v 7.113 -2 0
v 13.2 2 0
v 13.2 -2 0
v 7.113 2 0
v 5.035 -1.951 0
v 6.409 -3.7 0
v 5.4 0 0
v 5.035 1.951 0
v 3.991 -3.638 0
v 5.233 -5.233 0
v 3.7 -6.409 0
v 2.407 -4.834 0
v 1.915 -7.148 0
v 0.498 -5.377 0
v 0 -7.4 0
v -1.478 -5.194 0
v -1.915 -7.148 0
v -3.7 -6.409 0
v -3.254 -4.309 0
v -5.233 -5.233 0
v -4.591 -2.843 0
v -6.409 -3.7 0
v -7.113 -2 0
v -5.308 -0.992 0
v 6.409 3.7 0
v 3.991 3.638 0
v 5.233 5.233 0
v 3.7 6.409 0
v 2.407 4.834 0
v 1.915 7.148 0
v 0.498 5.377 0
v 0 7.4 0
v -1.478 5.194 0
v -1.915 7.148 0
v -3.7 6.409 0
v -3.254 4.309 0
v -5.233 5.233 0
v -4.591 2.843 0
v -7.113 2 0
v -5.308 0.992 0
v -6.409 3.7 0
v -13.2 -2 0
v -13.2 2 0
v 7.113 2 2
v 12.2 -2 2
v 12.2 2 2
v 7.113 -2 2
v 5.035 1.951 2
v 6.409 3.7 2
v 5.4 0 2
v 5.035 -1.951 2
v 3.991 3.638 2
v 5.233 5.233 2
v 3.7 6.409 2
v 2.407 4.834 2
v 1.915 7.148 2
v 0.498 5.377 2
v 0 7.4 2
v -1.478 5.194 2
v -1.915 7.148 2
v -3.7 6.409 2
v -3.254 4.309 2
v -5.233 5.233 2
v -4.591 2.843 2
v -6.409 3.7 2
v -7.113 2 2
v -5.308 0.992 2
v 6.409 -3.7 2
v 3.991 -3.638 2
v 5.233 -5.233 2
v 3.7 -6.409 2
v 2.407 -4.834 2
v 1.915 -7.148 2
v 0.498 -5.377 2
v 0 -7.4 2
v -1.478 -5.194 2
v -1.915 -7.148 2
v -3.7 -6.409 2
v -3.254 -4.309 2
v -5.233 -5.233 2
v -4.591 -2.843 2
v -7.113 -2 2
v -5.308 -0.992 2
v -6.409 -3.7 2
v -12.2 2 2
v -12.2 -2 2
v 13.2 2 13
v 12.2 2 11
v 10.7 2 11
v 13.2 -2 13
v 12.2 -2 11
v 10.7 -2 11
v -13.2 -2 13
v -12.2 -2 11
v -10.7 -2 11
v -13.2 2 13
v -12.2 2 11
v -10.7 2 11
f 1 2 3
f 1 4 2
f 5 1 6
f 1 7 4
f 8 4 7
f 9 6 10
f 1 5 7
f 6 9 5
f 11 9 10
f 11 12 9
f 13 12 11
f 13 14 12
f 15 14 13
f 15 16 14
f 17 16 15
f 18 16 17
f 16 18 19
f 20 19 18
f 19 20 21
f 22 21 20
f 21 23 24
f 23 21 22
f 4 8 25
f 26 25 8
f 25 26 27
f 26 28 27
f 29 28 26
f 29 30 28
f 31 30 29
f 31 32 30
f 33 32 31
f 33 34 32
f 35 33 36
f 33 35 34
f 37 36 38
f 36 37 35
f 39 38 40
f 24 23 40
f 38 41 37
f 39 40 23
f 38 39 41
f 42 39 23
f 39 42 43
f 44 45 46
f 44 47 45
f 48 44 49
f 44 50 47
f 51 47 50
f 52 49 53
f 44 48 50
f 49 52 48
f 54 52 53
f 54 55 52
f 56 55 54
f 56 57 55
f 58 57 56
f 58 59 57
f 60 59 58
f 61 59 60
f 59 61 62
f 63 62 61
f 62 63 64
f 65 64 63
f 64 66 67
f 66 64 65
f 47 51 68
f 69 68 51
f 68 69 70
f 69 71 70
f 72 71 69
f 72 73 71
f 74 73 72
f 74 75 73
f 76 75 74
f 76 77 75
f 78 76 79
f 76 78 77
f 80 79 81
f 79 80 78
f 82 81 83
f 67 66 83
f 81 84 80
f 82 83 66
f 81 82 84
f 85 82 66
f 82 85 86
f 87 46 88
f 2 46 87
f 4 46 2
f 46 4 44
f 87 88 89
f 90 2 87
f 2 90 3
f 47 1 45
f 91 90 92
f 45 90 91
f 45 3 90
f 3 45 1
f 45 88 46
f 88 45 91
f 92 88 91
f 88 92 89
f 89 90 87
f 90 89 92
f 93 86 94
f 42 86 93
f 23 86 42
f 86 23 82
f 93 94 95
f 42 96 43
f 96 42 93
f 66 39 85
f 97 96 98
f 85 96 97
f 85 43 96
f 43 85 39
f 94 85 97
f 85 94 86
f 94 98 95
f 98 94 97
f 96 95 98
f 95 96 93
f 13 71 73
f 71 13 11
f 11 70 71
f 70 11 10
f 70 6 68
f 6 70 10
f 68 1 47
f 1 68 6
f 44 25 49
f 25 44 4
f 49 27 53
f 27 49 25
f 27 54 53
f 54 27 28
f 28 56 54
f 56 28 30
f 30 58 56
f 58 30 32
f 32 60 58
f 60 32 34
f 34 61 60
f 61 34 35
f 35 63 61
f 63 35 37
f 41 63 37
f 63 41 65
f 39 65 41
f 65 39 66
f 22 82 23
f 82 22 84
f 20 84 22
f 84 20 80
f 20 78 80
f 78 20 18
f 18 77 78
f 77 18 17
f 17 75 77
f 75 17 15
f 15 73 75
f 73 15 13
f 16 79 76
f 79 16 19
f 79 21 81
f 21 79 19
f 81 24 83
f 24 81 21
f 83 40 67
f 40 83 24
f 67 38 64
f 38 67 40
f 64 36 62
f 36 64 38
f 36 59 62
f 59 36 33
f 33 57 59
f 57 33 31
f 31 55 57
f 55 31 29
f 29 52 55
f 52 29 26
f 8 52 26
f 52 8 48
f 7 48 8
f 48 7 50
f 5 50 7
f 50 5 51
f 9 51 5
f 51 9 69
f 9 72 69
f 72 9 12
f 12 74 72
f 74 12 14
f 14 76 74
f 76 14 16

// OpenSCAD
// motor clip for motor holder

// from motor_holder
// NOTE:  some tolerance added 
$mr = 10.7; // 10 mm radius + shrinkage
$mh = 15.8; // 15 mm height + shrinkage
$ml = 25.0; // 25.0 mm length excluding 'nubs'
$ml2 = 19.5; // 19.5 mm lengh excluding end cap and shaft guide hole 'nub'

$th = 4.0; // overall thickness of plastic around motor
$sw = 2;  // 2mm approximate height of guide

// dimensions for butt-end
$br = 5.4 ; // radius of hole for bearing housing (exclude notch)
$oh = 0.5;  // overhang
$bh = 9.0; // 'butt height' plus some clearance
$tt = 1.0;  // tab thickness


module tab(rr)
{
  color("red")
    rotate(a=[0,0,rr])
      union()
      {
        linear_extrude(height=2) // horiz
          translate([$br + $sw - 1,-$th/2,0])
            square([$mr+$oh+$th/2-$br-$sw + 1,$th]);

        translate([$mr+$oh+$th/2,-$th/2,0]) // vert
          rotate(a=[0,-90,0])
            linear_extrude(height=$tt)
              square([$bh + $sw + $tt/2,$th]);

        translate([$mr+$oh+$th/2,-$th/2,$sw+$bh])
          rotate(a=[-90,-90,0])
            linear_extrude(height=$th)
              polygon([[0,-$tt*2-$oh],[0,0],[$tt*2,0]]);
      }
}

color("black")
  linear_extrude(height=2)
    difference()
    {
      circle($br + $sw);
      circle($br);
    }

  tab(0);
  tab(180);
  
  
  
  
  
  
  
  
  
  
